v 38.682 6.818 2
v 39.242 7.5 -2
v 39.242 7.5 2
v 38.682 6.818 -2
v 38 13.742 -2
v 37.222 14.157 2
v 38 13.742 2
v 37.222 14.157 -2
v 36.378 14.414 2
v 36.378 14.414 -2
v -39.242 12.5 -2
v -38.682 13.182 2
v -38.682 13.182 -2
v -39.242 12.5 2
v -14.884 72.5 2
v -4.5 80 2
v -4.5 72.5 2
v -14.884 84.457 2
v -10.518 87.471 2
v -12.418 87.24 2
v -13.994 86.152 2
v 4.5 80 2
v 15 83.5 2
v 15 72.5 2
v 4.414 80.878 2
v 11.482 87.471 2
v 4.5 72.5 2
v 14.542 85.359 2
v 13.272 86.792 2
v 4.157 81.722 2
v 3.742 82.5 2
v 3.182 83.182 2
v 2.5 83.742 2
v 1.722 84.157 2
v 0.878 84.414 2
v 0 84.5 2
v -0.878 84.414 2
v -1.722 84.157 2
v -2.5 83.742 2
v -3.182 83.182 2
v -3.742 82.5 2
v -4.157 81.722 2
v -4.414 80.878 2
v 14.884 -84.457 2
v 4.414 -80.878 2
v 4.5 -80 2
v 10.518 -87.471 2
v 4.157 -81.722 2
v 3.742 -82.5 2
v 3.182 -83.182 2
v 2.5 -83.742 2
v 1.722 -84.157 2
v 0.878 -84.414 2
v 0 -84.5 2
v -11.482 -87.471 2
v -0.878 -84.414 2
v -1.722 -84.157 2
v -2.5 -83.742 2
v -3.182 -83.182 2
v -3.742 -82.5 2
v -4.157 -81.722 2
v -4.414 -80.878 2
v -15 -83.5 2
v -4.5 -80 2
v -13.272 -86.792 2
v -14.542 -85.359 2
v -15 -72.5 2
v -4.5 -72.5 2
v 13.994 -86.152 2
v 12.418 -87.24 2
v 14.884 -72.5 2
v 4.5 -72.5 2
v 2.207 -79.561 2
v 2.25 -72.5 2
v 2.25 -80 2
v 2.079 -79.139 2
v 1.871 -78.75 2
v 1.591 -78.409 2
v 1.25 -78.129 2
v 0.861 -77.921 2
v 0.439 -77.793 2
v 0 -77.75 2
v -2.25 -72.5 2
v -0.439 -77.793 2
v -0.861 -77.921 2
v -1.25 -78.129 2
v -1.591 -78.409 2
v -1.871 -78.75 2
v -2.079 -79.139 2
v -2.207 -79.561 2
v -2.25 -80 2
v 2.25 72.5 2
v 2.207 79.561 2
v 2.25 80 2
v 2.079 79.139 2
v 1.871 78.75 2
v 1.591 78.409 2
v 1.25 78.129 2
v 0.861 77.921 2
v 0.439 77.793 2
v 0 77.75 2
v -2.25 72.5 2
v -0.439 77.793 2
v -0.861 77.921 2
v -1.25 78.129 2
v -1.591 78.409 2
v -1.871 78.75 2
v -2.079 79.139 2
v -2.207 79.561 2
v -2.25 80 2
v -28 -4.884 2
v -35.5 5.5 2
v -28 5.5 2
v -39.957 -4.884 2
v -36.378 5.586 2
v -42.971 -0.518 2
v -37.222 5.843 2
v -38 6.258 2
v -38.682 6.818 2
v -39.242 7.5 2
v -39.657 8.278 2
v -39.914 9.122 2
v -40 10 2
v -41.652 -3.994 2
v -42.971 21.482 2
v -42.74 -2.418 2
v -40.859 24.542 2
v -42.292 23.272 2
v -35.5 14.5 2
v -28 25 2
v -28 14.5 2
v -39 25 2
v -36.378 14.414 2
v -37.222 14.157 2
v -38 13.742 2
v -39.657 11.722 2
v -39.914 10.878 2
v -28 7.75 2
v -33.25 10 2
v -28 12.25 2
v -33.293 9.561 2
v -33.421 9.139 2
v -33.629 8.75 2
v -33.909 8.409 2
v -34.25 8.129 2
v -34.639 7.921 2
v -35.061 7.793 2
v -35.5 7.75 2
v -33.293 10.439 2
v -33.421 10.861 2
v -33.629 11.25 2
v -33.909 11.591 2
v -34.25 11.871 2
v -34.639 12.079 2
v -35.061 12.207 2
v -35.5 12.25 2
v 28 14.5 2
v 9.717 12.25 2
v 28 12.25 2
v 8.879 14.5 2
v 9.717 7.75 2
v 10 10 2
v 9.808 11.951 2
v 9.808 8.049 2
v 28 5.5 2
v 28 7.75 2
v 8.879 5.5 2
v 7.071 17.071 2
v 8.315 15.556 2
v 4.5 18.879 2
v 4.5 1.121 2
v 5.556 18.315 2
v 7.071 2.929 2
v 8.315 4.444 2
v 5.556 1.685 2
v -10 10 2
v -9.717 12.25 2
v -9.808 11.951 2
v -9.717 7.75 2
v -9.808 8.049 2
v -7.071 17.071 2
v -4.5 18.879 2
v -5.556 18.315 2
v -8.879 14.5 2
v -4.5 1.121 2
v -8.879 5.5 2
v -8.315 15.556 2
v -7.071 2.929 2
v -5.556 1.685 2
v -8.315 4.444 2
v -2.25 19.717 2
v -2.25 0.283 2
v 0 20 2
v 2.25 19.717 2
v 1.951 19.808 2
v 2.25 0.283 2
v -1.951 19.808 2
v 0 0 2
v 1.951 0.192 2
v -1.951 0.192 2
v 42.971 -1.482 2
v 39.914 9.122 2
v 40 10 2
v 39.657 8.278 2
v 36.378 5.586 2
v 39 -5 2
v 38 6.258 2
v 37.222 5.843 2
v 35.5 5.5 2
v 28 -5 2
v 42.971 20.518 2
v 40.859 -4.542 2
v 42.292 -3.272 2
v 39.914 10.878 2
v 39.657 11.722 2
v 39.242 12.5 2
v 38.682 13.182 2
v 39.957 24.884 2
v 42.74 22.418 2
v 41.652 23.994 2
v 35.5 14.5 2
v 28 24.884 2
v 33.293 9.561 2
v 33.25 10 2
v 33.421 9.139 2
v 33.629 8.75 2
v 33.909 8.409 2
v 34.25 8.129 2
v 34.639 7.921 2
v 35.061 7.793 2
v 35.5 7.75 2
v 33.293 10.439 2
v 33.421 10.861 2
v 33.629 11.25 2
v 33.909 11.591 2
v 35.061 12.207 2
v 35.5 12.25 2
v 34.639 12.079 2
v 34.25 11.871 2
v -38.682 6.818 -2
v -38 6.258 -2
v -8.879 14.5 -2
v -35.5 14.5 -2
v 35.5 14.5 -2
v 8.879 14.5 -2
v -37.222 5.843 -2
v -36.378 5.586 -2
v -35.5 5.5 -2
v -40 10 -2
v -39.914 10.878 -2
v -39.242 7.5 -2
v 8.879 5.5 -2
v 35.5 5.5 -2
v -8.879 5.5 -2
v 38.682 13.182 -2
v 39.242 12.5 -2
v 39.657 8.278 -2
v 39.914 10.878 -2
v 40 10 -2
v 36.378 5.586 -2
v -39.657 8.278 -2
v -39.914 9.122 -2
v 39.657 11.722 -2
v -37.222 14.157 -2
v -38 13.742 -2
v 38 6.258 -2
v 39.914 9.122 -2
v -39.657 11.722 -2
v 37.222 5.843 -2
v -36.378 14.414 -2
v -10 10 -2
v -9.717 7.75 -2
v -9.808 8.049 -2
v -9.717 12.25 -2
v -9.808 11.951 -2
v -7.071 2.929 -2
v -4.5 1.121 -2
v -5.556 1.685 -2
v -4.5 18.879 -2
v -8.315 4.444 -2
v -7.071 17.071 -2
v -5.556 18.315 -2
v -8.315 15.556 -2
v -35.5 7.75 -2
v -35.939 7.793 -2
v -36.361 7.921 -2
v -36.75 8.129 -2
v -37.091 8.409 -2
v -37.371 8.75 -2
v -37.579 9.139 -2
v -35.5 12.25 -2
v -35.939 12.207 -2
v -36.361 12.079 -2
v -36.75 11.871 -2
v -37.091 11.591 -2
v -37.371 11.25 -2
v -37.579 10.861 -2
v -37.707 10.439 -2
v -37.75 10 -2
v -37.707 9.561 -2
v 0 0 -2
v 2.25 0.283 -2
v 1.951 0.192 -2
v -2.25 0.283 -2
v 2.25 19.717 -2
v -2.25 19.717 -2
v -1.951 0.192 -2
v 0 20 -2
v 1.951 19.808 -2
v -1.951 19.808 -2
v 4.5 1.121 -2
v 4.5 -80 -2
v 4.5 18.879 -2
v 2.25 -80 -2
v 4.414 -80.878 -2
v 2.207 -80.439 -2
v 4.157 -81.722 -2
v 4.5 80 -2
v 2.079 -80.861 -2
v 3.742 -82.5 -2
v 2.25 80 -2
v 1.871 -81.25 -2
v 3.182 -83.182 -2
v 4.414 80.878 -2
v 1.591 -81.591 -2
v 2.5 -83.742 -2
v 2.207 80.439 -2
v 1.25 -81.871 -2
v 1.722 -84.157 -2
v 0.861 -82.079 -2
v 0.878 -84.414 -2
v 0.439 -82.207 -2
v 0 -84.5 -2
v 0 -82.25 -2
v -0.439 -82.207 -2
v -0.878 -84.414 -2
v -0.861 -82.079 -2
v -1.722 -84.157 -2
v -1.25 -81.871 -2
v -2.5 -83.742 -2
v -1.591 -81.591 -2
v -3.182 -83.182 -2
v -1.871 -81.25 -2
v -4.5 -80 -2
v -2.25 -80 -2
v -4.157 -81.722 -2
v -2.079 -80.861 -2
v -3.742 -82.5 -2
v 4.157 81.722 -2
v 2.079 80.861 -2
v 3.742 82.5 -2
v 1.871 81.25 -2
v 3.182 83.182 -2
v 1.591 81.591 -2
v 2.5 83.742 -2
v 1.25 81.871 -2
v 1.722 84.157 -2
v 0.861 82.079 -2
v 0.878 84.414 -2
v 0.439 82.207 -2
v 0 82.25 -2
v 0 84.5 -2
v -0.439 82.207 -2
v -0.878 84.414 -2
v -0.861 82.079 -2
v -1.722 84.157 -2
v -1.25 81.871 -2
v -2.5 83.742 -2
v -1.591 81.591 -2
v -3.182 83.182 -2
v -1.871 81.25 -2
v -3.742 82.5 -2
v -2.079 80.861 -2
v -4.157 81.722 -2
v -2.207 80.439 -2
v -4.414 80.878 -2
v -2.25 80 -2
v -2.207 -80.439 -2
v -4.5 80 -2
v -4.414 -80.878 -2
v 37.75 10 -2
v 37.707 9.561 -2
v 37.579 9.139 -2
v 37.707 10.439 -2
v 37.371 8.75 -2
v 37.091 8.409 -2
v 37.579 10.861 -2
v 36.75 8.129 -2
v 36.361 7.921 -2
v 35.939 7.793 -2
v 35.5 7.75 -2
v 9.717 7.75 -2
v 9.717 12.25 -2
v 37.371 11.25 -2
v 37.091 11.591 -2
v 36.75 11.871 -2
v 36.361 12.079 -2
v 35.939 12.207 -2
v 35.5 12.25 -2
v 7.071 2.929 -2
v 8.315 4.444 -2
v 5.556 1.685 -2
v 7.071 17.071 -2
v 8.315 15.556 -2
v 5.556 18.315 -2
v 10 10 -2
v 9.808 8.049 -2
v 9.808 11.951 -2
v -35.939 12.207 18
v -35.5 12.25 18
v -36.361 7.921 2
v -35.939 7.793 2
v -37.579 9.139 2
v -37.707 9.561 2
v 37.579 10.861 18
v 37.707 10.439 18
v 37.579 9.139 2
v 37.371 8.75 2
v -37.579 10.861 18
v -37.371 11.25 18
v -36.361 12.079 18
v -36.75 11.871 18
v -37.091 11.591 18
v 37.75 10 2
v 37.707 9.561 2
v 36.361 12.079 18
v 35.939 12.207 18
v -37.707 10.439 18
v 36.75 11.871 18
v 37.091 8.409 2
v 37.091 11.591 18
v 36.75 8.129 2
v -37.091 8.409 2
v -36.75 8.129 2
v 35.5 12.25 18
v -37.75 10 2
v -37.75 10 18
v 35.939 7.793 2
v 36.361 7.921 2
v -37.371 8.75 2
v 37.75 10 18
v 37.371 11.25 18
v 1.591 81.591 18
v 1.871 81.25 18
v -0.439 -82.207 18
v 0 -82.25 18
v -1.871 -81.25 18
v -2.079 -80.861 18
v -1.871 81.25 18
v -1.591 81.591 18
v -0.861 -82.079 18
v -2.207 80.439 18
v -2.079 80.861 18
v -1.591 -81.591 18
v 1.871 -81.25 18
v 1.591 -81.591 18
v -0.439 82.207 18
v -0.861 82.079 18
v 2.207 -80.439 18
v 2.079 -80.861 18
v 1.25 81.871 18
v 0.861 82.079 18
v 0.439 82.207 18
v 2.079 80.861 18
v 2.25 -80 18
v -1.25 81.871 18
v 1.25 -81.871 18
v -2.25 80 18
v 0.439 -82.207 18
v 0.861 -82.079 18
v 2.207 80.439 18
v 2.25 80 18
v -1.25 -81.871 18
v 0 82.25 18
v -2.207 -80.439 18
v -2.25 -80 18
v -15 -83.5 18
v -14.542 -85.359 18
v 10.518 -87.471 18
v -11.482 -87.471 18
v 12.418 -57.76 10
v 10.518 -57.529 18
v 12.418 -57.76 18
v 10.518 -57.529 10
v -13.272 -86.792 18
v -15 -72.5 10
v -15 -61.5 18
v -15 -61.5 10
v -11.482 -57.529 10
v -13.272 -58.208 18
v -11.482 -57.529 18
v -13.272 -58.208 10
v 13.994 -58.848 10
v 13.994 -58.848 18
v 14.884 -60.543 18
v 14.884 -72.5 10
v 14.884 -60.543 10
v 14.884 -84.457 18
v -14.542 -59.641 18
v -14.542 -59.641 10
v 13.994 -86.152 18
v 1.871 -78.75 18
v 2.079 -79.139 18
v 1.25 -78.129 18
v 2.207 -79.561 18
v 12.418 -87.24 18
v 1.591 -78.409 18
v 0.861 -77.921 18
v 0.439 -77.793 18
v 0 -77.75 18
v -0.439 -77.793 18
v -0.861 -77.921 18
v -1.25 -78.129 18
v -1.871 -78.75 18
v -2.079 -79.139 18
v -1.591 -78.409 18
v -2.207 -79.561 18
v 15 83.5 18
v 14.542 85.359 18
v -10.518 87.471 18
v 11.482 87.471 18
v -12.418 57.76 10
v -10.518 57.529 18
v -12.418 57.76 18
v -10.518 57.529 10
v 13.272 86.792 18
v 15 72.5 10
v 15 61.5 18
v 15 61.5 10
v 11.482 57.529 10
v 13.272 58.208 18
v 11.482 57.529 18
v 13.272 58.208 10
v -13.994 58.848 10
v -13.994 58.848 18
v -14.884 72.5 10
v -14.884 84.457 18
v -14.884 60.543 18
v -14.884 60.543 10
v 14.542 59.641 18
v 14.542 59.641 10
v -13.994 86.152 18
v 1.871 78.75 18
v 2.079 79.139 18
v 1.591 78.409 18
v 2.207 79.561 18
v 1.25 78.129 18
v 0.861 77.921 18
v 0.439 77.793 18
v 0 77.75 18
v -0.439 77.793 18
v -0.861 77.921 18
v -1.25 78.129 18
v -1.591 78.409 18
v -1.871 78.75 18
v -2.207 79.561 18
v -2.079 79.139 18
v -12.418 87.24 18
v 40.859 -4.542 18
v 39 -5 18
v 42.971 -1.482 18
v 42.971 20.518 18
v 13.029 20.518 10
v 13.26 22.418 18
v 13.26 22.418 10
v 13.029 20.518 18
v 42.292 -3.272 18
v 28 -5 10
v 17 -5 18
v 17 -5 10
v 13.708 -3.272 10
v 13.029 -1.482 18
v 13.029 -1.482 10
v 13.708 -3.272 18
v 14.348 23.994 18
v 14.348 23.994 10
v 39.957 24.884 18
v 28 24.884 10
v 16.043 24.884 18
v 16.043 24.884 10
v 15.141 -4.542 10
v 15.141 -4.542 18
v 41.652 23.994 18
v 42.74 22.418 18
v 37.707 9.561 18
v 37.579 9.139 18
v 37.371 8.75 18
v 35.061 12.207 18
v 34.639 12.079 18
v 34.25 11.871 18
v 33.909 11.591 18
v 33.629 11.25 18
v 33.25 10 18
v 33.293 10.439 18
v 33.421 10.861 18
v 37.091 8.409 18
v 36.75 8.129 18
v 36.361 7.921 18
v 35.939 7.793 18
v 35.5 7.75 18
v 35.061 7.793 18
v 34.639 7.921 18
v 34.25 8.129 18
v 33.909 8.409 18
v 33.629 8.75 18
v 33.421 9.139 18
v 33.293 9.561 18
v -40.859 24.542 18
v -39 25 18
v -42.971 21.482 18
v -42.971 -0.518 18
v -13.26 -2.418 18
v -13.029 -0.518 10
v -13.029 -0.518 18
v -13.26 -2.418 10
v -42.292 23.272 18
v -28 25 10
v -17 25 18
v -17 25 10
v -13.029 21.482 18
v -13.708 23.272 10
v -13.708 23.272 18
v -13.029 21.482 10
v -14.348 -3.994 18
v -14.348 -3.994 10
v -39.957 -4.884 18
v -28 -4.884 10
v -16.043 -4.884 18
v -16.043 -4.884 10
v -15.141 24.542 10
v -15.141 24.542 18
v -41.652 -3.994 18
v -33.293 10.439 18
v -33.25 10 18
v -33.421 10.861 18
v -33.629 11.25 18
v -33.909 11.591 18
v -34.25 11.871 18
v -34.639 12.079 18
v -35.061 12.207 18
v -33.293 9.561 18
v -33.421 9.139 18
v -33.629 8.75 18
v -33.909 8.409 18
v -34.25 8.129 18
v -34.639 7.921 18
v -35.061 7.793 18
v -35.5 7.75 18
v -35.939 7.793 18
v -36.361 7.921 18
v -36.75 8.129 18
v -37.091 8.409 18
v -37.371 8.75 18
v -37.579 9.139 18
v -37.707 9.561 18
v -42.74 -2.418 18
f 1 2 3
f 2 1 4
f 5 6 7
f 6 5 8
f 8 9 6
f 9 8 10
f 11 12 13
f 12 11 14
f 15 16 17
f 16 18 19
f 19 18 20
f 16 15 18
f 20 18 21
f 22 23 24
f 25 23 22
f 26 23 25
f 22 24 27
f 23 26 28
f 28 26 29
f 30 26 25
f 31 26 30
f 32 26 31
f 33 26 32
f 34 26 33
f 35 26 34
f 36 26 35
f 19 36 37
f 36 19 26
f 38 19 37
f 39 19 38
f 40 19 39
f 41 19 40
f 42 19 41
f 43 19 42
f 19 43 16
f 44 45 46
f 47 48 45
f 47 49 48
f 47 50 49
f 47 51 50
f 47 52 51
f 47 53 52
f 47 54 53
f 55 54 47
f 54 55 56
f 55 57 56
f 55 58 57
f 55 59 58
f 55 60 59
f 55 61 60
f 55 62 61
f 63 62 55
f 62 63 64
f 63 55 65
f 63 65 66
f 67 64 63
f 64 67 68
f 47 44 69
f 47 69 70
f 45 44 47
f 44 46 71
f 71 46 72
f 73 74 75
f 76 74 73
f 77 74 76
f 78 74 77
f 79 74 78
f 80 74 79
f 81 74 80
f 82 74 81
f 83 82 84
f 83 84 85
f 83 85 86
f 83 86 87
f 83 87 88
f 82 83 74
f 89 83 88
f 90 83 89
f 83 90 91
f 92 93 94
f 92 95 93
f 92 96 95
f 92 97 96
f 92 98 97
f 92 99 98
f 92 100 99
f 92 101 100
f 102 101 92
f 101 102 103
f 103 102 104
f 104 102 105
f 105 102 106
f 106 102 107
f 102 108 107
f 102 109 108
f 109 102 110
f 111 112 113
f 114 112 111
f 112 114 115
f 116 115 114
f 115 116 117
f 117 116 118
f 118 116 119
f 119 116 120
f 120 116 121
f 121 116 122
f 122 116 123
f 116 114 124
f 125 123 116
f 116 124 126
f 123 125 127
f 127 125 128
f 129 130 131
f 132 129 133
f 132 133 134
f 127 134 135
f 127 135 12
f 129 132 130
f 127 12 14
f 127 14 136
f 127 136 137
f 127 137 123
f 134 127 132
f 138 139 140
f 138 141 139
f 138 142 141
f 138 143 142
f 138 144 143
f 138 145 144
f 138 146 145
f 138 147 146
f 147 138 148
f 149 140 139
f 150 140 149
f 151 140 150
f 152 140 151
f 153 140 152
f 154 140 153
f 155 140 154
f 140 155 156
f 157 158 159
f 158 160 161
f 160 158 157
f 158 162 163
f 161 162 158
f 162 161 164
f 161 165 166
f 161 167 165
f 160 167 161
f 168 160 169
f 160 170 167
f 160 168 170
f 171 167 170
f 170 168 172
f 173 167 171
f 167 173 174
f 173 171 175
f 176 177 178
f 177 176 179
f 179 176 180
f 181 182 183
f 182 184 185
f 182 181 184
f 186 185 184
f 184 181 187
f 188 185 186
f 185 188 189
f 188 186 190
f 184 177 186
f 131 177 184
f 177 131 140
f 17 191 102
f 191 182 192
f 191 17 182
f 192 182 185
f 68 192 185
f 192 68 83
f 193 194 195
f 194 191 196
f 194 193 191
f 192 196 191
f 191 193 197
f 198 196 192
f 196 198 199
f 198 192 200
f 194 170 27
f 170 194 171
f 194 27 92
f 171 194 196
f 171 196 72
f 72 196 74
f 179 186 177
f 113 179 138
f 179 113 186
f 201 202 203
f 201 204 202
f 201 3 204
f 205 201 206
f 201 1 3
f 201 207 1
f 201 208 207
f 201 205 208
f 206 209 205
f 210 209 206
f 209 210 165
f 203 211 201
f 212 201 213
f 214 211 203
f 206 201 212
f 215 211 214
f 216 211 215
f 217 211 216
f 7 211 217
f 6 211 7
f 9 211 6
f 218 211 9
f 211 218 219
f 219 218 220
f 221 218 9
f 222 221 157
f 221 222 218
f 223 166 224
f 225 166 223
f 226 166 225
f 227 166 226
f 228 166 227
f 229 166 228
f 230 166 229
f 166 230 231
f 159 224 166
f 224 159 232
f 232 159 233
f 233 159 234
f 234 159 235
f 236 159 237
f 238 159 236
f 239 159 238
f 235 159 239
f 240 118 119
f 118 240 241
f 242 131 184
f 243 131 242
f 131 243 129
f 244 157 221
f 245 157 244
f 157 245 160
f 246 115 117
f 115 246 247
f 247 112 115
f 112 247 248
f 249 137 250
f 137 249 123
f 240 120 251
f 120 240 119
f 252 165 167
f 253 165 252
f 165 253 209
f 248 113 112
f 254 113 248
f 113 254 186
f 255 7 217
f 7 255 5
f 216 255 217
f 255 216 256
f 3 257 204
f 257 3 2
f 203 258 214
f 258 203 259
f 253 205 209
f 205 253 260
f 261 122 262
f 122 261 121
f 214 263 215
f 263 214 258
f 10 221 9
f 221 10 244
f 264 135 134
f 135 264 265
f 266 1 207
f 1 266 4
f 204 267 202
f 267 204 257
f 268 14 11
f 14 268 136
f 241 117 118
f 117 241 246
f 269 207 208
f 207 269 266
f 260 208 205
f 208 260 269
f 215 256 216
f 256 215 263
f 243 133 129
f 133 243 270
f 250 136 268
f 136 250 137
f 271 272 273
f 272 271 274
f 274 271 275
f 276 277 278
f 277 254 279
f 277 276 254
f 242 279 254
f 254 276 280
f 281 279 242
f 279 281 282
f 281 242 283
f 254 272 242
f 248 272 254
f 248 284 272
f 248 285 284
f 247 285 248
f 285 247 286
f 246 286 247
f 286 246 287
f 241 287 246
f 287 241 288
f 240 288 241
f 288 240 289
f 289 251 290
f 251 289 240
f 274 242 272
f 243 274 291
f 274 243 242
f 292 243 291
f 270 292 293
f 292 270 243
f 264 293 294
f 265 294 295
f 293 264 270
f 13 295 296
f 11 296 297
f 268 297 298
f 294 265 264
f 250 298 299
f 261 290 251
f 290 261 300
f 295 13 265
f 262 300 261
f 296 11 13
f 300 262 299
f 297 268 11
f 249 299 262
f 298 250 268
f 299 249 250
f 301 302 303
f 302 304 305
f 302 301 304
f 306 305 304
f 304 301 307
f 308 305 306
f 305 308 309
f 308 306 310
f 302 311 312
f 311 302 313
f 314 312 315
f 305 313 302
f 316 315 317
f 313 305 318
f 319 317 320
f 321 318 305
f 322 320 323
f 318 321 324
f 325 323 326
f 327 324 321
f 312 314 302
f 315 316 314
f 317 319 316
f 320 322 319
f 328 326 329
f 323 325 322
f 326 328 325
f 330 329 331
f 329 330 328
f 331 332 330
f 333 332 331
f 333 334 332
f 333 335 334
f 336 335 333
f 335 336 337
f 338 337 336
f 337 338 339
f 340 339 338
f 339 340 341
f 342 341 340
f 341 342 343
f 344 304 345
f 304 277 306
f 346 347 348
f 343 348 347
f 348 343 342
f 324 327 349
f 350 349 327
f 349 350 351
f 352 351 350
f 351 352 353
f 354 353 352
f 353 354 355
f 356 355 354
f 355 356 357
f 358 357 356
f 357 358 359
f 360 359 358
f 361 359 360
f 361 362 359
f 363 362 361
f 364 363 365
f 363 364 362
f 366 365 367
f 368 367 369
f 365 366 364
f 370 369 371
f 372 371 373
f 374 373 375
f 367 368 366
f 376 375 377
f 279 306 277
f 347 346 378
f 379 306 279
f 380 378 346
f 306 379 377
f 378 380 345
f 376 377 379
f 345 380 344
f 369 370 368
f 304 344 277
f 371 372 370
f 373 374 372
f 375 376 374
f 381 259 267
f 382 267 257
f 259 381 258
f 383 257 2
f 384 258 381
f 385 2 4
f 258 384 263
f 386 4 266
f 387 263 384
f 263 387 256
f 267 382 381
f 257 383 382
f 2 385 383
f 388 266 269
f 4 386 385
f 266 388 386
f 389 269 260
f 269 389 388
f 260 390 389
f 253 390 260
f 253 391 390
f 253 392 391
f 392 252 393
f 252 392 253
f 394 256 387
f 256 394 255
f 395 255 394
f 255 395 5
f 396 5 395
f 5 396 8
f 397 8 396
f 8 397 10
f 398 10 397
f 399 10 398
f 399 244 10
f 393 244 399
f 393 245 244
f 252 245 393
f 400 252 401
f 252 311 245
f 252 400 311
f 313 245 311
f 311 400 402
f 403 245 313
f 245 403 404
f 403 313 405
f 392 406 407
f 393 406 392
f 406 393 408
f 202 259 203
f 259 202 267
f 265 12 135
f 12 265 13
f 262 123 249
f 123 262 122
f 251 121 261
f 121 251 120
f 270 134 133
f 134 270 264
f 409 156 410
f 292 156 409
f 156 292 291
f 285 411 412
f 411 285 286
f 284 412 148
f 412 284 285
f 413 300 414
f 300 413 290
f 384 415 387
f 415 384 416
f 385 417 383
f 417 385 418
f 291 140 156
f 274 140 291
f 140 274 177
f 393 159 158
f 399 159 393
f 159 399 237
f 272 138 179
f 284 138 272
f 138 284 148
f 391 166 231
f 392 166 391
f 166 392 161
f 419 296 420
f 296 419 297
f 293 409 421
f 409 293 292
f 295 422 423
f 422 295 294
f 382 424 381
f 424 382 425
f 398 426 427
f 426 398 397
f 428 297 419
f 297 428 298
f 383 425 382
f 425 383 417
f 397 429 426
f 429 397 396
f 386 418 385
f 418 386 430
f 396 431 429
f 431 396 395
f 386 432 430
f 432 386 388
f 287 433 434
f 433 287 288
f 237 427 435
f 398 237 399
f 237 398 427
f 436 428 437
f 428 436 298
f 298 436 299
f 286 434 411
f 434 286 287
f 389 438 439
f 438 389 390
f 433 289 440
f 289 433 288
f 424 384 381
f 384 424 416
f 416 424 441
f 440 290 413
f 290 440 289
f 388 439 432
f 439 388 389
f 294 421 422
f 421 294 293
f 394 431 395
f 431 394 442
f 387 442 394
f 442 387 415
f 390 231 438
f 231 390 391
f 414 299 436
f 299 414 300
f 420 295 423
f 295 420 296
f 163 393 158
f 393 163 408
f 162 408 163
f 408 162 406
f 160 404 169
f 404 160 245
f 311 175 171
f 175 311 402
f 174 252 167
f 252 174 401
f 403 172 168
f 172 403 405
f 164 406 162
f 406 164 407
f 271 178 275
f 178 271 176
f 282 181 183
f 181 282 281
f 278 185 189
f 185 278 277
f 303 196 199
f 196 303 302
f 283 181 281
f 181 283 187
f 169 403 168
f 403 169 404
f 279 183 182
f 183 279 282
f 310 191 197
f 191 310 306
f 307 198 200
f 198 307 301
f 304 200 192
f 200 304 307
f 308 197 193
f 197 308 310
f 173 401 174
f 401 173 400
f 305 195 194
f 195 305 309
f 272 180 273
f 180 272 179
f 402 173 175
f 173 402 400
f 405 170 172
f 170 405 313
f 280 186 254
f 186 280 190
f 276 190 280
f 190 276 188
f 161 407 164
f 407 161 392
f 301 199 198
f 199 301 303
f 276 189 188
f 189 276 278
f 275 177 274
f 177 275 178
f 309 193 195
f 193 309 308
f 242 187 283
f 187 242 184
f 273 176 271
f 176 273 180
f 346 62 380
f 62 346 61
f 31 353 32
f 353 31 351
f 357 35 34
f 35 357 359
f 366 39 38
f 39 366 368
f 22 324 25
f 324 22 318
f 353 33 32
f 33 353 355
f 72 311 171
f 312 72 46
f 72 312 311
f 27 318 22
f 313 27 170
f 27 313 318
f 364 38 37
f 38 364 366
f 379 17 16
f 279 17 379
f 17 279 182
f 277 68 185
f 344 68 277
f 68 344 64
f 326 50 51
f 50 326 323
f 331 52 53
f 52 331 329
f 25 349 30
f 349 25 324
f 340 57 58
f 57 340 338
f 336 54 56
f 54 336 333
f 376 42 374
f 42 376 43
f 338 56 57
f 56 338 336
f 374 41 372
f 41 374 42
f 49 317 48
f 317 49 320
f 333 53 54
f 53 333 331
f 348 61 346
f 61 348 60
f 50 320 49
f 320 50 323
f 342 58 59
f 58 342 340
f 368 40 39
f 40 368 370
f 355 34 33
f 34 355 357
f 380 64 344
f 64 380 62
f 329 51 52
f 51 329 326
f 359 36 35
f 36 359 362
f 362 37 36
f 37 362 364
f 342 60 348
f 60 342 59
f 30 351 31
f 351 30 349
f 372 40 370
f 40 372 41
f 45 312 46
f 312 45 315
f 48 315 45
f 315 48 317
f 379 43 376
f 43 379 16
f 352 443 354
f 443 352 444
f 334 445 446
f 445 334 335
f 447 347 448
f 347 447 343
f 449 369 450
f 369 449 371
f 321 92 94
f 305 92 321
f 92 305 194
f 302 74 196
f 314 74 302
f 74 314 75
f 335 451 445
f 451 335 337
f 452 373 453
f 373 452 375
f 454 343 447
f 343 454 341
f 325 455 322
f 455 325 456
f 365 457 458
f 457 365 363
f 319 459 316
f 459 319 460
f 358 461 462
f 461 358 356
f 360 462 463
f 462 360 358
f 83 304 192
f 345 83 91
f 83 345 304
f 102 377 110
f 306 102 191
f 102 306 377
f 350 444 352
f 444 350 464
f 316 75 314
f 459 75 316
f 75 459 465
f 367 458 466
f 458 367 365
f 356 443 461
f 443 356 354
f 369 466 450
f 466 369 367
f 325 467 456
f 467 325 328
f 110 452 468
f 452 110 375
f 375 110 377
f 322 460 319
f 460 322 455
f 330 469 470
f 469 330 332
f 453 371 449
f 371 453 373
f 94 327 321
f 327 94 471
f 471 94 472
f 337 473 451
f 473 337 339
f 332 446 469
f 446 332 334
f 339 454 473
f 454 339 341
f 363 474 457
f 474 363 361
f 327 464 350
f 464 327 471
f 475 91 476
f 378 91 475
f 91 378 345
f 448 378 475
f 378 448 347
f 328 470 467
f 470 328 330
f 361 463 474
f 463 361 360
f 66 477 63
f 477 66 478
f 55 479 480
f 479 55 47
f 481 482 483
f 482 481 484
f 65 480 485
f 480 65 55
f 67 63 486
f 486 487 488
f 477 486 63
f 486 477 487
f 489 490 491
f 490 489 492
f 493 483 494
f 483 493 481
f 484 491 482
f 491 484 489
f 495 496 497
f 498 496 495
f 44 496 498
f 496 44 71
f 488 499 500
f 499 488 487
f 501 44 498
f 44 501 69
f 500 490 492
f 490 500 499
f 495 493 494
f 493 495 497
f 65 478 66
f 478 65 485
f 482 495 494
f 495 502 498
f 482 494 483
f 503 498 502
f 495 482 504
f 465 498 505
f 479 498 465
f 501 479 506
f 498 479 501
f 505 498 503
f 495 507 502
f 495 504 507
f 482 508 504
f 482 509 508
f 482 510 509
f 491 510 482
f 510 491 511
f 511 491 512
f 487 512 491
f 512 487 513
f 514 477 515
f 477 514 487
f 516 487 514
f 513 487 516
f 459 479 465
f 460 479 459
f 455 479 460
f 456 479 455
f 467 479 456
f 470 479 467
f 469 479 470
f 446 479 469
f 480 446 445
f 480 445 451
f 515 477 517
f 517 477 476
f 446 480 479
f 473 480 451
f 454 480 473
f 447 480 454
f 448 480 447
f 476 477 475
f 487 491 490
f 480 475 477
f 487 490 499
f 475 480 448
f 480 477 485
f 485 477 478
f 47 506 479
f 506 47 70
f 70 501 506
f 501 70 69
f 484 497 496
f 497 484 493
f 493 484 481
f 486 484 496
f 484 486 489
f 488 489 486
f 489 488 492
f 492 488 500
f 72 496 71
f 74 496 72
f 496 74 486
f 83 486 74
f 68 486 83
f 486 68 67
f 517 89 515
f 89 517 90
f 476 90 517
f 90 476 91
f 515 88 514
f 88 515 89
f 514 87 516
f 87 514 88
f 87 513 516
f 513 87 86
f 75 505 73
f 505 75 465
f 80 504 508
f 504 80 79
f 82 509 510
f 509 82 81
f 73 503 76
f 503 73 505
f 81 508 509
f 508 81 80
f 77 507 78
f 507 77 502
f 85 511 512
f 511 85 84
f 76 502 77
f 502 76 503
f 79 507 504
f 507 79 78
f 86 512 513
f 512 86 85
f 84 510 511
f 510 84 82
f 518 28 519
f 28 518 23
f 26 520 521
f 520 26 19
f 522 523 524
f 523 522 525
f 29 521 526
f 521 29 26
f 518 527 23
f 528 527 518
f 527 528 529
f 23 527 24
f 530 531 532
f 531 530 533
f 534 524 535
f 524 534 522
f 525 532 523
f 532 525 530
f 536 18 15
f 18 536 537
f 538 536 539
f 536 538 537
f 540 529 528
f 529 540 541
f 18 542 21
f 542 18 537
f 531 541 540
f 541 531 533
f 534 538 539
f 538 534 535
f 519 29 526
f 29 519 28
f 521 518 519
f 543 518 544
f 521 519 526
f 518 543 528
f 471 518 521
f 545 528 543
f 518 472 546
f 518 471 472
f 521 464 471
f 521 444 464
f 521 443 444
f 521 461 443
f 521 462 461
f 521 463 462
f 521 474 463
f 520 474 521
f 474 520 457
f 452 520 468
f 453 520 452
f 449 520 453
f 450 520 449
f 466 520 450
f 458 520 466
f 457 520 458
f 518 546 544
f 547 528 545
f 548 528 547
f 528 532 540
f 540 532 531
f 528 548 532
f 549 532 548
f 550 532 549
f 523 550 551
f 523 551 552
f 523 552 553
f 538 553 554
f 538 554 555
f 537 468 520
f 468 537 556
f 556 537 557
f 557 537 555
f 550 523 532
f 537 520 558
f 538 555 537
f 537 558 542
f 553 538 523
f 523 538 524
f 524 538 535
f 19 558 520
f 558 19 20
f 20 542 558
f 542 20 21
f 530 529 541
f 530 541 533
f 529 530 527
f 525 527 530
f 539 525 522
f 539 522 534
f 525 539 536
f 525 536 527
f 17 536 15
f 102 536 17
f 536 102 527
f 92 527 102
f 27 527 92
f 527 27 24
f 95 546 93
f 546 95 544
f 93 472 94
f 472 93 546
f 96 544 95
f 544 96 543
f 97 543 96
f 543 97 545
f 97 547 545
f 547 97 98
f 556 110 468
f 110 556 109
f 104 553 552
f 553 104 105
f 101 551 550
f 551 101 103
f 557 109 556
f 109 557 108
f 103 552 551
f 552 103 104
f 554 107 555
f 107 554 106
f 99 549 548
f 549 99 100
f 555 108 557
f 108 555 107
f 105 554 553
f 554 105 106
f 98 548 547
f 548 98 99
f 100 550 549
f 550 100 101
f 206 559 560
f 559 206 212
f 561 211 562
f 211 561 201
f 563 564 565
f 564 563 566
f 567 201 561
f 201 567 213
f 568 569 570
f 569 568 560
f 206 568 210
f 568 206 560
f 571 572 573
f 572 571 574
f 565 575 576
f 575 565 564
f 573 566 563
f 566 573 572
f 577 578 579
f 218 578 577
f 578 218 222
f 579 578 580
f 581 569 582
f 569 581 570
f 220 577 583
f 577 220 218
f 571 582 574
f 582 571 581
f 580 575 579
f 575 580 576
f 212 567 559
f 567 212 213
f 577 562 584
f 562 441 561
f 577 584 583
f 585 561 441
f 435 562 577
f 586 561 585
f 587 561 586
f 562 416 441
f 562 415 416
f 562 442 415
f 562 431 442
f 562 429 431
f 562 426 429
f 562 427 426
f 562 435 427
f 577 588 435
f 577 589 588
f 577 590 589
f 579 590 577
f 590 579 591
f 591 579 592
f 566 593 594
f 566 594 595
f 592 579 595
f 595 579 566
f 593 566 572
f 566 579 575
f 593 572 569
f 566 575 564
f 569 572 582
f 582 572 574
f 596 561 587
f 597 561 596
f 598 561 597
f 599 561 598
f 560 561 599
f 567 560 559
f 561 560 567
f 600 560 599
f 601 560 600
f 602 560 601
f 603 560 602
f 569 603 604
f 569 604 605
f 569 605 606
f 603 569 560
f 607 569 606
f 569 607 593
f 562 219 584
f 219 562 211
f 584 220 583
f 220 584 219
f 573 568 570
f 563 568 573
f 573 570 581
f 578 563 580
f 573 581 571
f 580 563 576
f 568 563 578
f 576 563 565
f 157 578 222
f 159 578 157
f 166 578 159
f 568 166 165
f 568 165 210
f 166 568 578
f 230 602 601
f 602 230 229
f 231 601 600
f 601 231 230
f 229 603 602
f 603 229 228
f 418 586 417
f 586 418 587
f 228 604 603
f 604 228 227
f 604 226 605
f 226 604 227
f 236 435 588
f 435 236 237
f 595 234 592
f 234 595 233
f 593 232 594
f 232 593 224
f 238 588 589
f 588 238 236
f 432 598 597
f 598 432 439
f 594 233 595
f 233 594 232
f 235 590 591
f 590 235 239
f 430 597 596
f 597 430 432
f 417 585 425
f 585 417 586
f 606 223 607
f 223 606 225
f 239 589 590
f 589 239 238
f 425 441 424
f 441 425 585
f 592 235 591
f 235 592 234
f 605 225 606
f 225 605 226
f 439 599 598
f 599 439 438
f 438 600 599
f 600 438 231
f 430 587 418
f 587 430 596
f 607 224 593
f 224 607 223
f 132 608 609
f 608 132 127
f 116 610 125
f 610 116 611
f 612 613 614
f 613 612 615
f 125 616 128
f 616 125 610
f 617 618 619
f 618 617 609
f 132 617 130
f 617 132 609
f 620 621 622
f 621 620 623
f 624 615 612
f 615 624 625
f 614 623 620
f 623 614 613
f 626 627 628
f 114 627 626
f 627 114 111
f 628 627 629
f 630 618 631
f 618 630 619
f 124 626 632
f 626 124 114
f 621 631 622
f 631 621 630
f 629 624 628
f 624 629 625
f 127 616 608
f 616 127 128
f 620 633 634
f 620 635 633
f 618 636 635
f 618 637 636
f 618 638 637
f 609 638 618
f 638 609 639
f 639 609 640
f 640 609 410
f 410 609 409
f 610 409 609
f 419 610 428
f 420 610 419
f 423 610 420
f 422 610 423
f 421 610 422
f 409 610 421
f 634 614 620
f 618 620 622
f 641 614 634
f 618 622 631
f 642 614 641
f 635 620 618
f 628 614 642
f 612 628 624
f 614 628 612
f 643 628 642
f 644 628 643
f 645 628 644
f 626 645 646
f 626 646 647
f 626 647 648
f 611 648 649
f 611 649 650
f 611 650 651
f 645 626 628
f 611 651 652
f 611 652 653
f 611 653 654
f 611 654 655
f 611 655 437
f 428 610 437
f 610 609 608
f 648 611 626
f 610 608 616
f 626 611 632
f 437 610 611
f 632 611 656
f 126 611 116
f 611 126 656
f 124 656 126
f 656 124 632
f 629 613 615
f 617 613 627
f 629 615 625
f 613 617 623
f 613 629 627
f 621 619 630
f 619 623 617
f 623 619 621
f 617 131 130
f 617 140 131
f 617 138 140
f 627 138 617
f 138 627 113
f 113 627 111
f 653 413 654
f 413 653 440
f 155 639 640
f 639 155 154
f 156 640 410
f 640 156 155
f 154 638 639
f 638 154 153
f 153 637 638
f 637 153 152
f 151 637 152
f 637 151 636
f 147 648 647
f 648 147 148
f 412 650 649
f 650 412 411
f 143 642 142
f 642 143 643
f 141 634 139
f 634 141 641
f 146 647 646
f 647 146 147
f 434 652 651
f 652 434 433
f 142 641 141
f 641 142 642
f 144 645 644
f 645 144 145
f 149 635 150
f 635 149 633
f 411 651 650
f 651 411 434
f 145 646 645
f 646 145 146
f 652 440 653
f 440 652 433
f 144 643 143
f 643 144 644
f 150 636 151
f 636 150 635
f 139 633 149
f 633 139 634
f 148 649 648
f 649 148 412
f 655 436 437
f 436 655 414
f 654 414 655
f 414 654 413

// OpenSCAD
len_phone = 145;
width_phone = 56;
thickness_phone = 8;
corner_round = 8;

d_screw_m4 = 4.5;
thickness_holder = 4;
append = 15;
w_grip = 30;

holder_set();
// horizontal_block(20);
// vertical_block(len_phone);
//grip();

module grip(){
    difference(){
        grip_base();

        color("red")
        translate([0, w_grip/2, thickness_phone])
        cube([w_grip+1, w_grip, 2*thickness_phone], center=true);
        
        translate ([0, -w_grip/4, 0])
        cylinder(d=d_screw_m4, 3*thickness_phone, center=true, $fn=32);
    }
}

module grip_base() {
    hull() {
        translate([w_grip/2-corner_round/2, -w_grip/2+corner_round/2, 0])
        cylinder(d=corner_round, 2*thickness_phone, center=true);
        translate([-w_grip/2+corner_round/2, -w_grip/2+corner_round/2, 0])
        cylinder(d=corner_round, 2*thickness_phone, center=true);
        translate([w_grip/2-corner_round/2, w_grip/2-corner_round/2, 0])
        cylinder(d=corner_round, 2*thickness_phone, center=true);
        translate([-w_grip/2+corner_round/2, w_grip/2-corner_round/2, 0])
        cylinder(d=corner_round, 2*thickness_phone, center=true);
    }
}

module holder_set() {
    horizontal_block(len_block=width_phone, offset_vertical=10);
    vertical_block(len_block=len_phone);
    
    translate([0, -len_phone/2, thickness_phone+thickness_holder/2])
    rotate([0, 180, 0])
    grip();
    
    translate([0, len_phone/2, thickness_phone+thickness_holder/2])
    rotate([0, 180, 180])
    grip();
    
    translate([width_phone/2, 10, thickness_phone+thickness_holder/2])
    rotate([0, 180, 90])
    grip();
    
    translate([-width_phone/2, 10, thickness_phone+thickness_holder/2])
    rotate([0, 180, -90])
    grip();
    
}

module vertical_block(len_block) {
    len_block = len_block + append;
    difference() {

        hull() {
            //translate([0, -len_phone/2, 0])
            translate([0, -len_block/2, 0])
                cylinder(d=9, h=thickness_holder, center=true, $fn=32);

            //translate([0, len_phone/2, 0])
            translate([0, len_block/2, 0])
                cylinder(d=9, h=thickness_holder, center=true, $fn=32);
        }
        color("red")
        hull() {
            // translate([0, -len_phone/2, 0])
            translate([0, -len_block/2, 0])
                cylinder(d=d_screw_m4, h=thickness_holder+2, center=true, $fn=32);

            // translate([0, len_phone/2, 0])
            translate([0, len_block/2, 0])
                cylinder(d=d_screw_m4, h=thickness_holder+2, center=true, $fn=32);
        }
    }
}

module horizontal_block(len_block, offset_vertical) {
    len_block = len_block + append;
    translate([0, offset_vertical, 0])
    cylinder(d=20, h=thickness_holder, center=true, $fn=32);

    difference() {
        hull() {
            translate([len_block/2, offset_vertical, 0])
                cylinder(d=9, h=thickness_holder, center=true, $fn=32);

            translate([-len_block/2, offset_vertical, 0])
                cylinder(d=9, h=thickness_holder, center=true, $fn=32);
        }
        color("red")
        hull() {
            translate([len_block/2, offset_vertical,, 0])
                cylinder(d=d_screw_m4, h=thickness_holder+2, center=true, $fn=32);

            translate([-len_block/2, offset_vertical,, 0])
                cylinder(d=d_screw_m4, h=thickness_holder+2, center=true, $fn=32);
        }
    }
}
